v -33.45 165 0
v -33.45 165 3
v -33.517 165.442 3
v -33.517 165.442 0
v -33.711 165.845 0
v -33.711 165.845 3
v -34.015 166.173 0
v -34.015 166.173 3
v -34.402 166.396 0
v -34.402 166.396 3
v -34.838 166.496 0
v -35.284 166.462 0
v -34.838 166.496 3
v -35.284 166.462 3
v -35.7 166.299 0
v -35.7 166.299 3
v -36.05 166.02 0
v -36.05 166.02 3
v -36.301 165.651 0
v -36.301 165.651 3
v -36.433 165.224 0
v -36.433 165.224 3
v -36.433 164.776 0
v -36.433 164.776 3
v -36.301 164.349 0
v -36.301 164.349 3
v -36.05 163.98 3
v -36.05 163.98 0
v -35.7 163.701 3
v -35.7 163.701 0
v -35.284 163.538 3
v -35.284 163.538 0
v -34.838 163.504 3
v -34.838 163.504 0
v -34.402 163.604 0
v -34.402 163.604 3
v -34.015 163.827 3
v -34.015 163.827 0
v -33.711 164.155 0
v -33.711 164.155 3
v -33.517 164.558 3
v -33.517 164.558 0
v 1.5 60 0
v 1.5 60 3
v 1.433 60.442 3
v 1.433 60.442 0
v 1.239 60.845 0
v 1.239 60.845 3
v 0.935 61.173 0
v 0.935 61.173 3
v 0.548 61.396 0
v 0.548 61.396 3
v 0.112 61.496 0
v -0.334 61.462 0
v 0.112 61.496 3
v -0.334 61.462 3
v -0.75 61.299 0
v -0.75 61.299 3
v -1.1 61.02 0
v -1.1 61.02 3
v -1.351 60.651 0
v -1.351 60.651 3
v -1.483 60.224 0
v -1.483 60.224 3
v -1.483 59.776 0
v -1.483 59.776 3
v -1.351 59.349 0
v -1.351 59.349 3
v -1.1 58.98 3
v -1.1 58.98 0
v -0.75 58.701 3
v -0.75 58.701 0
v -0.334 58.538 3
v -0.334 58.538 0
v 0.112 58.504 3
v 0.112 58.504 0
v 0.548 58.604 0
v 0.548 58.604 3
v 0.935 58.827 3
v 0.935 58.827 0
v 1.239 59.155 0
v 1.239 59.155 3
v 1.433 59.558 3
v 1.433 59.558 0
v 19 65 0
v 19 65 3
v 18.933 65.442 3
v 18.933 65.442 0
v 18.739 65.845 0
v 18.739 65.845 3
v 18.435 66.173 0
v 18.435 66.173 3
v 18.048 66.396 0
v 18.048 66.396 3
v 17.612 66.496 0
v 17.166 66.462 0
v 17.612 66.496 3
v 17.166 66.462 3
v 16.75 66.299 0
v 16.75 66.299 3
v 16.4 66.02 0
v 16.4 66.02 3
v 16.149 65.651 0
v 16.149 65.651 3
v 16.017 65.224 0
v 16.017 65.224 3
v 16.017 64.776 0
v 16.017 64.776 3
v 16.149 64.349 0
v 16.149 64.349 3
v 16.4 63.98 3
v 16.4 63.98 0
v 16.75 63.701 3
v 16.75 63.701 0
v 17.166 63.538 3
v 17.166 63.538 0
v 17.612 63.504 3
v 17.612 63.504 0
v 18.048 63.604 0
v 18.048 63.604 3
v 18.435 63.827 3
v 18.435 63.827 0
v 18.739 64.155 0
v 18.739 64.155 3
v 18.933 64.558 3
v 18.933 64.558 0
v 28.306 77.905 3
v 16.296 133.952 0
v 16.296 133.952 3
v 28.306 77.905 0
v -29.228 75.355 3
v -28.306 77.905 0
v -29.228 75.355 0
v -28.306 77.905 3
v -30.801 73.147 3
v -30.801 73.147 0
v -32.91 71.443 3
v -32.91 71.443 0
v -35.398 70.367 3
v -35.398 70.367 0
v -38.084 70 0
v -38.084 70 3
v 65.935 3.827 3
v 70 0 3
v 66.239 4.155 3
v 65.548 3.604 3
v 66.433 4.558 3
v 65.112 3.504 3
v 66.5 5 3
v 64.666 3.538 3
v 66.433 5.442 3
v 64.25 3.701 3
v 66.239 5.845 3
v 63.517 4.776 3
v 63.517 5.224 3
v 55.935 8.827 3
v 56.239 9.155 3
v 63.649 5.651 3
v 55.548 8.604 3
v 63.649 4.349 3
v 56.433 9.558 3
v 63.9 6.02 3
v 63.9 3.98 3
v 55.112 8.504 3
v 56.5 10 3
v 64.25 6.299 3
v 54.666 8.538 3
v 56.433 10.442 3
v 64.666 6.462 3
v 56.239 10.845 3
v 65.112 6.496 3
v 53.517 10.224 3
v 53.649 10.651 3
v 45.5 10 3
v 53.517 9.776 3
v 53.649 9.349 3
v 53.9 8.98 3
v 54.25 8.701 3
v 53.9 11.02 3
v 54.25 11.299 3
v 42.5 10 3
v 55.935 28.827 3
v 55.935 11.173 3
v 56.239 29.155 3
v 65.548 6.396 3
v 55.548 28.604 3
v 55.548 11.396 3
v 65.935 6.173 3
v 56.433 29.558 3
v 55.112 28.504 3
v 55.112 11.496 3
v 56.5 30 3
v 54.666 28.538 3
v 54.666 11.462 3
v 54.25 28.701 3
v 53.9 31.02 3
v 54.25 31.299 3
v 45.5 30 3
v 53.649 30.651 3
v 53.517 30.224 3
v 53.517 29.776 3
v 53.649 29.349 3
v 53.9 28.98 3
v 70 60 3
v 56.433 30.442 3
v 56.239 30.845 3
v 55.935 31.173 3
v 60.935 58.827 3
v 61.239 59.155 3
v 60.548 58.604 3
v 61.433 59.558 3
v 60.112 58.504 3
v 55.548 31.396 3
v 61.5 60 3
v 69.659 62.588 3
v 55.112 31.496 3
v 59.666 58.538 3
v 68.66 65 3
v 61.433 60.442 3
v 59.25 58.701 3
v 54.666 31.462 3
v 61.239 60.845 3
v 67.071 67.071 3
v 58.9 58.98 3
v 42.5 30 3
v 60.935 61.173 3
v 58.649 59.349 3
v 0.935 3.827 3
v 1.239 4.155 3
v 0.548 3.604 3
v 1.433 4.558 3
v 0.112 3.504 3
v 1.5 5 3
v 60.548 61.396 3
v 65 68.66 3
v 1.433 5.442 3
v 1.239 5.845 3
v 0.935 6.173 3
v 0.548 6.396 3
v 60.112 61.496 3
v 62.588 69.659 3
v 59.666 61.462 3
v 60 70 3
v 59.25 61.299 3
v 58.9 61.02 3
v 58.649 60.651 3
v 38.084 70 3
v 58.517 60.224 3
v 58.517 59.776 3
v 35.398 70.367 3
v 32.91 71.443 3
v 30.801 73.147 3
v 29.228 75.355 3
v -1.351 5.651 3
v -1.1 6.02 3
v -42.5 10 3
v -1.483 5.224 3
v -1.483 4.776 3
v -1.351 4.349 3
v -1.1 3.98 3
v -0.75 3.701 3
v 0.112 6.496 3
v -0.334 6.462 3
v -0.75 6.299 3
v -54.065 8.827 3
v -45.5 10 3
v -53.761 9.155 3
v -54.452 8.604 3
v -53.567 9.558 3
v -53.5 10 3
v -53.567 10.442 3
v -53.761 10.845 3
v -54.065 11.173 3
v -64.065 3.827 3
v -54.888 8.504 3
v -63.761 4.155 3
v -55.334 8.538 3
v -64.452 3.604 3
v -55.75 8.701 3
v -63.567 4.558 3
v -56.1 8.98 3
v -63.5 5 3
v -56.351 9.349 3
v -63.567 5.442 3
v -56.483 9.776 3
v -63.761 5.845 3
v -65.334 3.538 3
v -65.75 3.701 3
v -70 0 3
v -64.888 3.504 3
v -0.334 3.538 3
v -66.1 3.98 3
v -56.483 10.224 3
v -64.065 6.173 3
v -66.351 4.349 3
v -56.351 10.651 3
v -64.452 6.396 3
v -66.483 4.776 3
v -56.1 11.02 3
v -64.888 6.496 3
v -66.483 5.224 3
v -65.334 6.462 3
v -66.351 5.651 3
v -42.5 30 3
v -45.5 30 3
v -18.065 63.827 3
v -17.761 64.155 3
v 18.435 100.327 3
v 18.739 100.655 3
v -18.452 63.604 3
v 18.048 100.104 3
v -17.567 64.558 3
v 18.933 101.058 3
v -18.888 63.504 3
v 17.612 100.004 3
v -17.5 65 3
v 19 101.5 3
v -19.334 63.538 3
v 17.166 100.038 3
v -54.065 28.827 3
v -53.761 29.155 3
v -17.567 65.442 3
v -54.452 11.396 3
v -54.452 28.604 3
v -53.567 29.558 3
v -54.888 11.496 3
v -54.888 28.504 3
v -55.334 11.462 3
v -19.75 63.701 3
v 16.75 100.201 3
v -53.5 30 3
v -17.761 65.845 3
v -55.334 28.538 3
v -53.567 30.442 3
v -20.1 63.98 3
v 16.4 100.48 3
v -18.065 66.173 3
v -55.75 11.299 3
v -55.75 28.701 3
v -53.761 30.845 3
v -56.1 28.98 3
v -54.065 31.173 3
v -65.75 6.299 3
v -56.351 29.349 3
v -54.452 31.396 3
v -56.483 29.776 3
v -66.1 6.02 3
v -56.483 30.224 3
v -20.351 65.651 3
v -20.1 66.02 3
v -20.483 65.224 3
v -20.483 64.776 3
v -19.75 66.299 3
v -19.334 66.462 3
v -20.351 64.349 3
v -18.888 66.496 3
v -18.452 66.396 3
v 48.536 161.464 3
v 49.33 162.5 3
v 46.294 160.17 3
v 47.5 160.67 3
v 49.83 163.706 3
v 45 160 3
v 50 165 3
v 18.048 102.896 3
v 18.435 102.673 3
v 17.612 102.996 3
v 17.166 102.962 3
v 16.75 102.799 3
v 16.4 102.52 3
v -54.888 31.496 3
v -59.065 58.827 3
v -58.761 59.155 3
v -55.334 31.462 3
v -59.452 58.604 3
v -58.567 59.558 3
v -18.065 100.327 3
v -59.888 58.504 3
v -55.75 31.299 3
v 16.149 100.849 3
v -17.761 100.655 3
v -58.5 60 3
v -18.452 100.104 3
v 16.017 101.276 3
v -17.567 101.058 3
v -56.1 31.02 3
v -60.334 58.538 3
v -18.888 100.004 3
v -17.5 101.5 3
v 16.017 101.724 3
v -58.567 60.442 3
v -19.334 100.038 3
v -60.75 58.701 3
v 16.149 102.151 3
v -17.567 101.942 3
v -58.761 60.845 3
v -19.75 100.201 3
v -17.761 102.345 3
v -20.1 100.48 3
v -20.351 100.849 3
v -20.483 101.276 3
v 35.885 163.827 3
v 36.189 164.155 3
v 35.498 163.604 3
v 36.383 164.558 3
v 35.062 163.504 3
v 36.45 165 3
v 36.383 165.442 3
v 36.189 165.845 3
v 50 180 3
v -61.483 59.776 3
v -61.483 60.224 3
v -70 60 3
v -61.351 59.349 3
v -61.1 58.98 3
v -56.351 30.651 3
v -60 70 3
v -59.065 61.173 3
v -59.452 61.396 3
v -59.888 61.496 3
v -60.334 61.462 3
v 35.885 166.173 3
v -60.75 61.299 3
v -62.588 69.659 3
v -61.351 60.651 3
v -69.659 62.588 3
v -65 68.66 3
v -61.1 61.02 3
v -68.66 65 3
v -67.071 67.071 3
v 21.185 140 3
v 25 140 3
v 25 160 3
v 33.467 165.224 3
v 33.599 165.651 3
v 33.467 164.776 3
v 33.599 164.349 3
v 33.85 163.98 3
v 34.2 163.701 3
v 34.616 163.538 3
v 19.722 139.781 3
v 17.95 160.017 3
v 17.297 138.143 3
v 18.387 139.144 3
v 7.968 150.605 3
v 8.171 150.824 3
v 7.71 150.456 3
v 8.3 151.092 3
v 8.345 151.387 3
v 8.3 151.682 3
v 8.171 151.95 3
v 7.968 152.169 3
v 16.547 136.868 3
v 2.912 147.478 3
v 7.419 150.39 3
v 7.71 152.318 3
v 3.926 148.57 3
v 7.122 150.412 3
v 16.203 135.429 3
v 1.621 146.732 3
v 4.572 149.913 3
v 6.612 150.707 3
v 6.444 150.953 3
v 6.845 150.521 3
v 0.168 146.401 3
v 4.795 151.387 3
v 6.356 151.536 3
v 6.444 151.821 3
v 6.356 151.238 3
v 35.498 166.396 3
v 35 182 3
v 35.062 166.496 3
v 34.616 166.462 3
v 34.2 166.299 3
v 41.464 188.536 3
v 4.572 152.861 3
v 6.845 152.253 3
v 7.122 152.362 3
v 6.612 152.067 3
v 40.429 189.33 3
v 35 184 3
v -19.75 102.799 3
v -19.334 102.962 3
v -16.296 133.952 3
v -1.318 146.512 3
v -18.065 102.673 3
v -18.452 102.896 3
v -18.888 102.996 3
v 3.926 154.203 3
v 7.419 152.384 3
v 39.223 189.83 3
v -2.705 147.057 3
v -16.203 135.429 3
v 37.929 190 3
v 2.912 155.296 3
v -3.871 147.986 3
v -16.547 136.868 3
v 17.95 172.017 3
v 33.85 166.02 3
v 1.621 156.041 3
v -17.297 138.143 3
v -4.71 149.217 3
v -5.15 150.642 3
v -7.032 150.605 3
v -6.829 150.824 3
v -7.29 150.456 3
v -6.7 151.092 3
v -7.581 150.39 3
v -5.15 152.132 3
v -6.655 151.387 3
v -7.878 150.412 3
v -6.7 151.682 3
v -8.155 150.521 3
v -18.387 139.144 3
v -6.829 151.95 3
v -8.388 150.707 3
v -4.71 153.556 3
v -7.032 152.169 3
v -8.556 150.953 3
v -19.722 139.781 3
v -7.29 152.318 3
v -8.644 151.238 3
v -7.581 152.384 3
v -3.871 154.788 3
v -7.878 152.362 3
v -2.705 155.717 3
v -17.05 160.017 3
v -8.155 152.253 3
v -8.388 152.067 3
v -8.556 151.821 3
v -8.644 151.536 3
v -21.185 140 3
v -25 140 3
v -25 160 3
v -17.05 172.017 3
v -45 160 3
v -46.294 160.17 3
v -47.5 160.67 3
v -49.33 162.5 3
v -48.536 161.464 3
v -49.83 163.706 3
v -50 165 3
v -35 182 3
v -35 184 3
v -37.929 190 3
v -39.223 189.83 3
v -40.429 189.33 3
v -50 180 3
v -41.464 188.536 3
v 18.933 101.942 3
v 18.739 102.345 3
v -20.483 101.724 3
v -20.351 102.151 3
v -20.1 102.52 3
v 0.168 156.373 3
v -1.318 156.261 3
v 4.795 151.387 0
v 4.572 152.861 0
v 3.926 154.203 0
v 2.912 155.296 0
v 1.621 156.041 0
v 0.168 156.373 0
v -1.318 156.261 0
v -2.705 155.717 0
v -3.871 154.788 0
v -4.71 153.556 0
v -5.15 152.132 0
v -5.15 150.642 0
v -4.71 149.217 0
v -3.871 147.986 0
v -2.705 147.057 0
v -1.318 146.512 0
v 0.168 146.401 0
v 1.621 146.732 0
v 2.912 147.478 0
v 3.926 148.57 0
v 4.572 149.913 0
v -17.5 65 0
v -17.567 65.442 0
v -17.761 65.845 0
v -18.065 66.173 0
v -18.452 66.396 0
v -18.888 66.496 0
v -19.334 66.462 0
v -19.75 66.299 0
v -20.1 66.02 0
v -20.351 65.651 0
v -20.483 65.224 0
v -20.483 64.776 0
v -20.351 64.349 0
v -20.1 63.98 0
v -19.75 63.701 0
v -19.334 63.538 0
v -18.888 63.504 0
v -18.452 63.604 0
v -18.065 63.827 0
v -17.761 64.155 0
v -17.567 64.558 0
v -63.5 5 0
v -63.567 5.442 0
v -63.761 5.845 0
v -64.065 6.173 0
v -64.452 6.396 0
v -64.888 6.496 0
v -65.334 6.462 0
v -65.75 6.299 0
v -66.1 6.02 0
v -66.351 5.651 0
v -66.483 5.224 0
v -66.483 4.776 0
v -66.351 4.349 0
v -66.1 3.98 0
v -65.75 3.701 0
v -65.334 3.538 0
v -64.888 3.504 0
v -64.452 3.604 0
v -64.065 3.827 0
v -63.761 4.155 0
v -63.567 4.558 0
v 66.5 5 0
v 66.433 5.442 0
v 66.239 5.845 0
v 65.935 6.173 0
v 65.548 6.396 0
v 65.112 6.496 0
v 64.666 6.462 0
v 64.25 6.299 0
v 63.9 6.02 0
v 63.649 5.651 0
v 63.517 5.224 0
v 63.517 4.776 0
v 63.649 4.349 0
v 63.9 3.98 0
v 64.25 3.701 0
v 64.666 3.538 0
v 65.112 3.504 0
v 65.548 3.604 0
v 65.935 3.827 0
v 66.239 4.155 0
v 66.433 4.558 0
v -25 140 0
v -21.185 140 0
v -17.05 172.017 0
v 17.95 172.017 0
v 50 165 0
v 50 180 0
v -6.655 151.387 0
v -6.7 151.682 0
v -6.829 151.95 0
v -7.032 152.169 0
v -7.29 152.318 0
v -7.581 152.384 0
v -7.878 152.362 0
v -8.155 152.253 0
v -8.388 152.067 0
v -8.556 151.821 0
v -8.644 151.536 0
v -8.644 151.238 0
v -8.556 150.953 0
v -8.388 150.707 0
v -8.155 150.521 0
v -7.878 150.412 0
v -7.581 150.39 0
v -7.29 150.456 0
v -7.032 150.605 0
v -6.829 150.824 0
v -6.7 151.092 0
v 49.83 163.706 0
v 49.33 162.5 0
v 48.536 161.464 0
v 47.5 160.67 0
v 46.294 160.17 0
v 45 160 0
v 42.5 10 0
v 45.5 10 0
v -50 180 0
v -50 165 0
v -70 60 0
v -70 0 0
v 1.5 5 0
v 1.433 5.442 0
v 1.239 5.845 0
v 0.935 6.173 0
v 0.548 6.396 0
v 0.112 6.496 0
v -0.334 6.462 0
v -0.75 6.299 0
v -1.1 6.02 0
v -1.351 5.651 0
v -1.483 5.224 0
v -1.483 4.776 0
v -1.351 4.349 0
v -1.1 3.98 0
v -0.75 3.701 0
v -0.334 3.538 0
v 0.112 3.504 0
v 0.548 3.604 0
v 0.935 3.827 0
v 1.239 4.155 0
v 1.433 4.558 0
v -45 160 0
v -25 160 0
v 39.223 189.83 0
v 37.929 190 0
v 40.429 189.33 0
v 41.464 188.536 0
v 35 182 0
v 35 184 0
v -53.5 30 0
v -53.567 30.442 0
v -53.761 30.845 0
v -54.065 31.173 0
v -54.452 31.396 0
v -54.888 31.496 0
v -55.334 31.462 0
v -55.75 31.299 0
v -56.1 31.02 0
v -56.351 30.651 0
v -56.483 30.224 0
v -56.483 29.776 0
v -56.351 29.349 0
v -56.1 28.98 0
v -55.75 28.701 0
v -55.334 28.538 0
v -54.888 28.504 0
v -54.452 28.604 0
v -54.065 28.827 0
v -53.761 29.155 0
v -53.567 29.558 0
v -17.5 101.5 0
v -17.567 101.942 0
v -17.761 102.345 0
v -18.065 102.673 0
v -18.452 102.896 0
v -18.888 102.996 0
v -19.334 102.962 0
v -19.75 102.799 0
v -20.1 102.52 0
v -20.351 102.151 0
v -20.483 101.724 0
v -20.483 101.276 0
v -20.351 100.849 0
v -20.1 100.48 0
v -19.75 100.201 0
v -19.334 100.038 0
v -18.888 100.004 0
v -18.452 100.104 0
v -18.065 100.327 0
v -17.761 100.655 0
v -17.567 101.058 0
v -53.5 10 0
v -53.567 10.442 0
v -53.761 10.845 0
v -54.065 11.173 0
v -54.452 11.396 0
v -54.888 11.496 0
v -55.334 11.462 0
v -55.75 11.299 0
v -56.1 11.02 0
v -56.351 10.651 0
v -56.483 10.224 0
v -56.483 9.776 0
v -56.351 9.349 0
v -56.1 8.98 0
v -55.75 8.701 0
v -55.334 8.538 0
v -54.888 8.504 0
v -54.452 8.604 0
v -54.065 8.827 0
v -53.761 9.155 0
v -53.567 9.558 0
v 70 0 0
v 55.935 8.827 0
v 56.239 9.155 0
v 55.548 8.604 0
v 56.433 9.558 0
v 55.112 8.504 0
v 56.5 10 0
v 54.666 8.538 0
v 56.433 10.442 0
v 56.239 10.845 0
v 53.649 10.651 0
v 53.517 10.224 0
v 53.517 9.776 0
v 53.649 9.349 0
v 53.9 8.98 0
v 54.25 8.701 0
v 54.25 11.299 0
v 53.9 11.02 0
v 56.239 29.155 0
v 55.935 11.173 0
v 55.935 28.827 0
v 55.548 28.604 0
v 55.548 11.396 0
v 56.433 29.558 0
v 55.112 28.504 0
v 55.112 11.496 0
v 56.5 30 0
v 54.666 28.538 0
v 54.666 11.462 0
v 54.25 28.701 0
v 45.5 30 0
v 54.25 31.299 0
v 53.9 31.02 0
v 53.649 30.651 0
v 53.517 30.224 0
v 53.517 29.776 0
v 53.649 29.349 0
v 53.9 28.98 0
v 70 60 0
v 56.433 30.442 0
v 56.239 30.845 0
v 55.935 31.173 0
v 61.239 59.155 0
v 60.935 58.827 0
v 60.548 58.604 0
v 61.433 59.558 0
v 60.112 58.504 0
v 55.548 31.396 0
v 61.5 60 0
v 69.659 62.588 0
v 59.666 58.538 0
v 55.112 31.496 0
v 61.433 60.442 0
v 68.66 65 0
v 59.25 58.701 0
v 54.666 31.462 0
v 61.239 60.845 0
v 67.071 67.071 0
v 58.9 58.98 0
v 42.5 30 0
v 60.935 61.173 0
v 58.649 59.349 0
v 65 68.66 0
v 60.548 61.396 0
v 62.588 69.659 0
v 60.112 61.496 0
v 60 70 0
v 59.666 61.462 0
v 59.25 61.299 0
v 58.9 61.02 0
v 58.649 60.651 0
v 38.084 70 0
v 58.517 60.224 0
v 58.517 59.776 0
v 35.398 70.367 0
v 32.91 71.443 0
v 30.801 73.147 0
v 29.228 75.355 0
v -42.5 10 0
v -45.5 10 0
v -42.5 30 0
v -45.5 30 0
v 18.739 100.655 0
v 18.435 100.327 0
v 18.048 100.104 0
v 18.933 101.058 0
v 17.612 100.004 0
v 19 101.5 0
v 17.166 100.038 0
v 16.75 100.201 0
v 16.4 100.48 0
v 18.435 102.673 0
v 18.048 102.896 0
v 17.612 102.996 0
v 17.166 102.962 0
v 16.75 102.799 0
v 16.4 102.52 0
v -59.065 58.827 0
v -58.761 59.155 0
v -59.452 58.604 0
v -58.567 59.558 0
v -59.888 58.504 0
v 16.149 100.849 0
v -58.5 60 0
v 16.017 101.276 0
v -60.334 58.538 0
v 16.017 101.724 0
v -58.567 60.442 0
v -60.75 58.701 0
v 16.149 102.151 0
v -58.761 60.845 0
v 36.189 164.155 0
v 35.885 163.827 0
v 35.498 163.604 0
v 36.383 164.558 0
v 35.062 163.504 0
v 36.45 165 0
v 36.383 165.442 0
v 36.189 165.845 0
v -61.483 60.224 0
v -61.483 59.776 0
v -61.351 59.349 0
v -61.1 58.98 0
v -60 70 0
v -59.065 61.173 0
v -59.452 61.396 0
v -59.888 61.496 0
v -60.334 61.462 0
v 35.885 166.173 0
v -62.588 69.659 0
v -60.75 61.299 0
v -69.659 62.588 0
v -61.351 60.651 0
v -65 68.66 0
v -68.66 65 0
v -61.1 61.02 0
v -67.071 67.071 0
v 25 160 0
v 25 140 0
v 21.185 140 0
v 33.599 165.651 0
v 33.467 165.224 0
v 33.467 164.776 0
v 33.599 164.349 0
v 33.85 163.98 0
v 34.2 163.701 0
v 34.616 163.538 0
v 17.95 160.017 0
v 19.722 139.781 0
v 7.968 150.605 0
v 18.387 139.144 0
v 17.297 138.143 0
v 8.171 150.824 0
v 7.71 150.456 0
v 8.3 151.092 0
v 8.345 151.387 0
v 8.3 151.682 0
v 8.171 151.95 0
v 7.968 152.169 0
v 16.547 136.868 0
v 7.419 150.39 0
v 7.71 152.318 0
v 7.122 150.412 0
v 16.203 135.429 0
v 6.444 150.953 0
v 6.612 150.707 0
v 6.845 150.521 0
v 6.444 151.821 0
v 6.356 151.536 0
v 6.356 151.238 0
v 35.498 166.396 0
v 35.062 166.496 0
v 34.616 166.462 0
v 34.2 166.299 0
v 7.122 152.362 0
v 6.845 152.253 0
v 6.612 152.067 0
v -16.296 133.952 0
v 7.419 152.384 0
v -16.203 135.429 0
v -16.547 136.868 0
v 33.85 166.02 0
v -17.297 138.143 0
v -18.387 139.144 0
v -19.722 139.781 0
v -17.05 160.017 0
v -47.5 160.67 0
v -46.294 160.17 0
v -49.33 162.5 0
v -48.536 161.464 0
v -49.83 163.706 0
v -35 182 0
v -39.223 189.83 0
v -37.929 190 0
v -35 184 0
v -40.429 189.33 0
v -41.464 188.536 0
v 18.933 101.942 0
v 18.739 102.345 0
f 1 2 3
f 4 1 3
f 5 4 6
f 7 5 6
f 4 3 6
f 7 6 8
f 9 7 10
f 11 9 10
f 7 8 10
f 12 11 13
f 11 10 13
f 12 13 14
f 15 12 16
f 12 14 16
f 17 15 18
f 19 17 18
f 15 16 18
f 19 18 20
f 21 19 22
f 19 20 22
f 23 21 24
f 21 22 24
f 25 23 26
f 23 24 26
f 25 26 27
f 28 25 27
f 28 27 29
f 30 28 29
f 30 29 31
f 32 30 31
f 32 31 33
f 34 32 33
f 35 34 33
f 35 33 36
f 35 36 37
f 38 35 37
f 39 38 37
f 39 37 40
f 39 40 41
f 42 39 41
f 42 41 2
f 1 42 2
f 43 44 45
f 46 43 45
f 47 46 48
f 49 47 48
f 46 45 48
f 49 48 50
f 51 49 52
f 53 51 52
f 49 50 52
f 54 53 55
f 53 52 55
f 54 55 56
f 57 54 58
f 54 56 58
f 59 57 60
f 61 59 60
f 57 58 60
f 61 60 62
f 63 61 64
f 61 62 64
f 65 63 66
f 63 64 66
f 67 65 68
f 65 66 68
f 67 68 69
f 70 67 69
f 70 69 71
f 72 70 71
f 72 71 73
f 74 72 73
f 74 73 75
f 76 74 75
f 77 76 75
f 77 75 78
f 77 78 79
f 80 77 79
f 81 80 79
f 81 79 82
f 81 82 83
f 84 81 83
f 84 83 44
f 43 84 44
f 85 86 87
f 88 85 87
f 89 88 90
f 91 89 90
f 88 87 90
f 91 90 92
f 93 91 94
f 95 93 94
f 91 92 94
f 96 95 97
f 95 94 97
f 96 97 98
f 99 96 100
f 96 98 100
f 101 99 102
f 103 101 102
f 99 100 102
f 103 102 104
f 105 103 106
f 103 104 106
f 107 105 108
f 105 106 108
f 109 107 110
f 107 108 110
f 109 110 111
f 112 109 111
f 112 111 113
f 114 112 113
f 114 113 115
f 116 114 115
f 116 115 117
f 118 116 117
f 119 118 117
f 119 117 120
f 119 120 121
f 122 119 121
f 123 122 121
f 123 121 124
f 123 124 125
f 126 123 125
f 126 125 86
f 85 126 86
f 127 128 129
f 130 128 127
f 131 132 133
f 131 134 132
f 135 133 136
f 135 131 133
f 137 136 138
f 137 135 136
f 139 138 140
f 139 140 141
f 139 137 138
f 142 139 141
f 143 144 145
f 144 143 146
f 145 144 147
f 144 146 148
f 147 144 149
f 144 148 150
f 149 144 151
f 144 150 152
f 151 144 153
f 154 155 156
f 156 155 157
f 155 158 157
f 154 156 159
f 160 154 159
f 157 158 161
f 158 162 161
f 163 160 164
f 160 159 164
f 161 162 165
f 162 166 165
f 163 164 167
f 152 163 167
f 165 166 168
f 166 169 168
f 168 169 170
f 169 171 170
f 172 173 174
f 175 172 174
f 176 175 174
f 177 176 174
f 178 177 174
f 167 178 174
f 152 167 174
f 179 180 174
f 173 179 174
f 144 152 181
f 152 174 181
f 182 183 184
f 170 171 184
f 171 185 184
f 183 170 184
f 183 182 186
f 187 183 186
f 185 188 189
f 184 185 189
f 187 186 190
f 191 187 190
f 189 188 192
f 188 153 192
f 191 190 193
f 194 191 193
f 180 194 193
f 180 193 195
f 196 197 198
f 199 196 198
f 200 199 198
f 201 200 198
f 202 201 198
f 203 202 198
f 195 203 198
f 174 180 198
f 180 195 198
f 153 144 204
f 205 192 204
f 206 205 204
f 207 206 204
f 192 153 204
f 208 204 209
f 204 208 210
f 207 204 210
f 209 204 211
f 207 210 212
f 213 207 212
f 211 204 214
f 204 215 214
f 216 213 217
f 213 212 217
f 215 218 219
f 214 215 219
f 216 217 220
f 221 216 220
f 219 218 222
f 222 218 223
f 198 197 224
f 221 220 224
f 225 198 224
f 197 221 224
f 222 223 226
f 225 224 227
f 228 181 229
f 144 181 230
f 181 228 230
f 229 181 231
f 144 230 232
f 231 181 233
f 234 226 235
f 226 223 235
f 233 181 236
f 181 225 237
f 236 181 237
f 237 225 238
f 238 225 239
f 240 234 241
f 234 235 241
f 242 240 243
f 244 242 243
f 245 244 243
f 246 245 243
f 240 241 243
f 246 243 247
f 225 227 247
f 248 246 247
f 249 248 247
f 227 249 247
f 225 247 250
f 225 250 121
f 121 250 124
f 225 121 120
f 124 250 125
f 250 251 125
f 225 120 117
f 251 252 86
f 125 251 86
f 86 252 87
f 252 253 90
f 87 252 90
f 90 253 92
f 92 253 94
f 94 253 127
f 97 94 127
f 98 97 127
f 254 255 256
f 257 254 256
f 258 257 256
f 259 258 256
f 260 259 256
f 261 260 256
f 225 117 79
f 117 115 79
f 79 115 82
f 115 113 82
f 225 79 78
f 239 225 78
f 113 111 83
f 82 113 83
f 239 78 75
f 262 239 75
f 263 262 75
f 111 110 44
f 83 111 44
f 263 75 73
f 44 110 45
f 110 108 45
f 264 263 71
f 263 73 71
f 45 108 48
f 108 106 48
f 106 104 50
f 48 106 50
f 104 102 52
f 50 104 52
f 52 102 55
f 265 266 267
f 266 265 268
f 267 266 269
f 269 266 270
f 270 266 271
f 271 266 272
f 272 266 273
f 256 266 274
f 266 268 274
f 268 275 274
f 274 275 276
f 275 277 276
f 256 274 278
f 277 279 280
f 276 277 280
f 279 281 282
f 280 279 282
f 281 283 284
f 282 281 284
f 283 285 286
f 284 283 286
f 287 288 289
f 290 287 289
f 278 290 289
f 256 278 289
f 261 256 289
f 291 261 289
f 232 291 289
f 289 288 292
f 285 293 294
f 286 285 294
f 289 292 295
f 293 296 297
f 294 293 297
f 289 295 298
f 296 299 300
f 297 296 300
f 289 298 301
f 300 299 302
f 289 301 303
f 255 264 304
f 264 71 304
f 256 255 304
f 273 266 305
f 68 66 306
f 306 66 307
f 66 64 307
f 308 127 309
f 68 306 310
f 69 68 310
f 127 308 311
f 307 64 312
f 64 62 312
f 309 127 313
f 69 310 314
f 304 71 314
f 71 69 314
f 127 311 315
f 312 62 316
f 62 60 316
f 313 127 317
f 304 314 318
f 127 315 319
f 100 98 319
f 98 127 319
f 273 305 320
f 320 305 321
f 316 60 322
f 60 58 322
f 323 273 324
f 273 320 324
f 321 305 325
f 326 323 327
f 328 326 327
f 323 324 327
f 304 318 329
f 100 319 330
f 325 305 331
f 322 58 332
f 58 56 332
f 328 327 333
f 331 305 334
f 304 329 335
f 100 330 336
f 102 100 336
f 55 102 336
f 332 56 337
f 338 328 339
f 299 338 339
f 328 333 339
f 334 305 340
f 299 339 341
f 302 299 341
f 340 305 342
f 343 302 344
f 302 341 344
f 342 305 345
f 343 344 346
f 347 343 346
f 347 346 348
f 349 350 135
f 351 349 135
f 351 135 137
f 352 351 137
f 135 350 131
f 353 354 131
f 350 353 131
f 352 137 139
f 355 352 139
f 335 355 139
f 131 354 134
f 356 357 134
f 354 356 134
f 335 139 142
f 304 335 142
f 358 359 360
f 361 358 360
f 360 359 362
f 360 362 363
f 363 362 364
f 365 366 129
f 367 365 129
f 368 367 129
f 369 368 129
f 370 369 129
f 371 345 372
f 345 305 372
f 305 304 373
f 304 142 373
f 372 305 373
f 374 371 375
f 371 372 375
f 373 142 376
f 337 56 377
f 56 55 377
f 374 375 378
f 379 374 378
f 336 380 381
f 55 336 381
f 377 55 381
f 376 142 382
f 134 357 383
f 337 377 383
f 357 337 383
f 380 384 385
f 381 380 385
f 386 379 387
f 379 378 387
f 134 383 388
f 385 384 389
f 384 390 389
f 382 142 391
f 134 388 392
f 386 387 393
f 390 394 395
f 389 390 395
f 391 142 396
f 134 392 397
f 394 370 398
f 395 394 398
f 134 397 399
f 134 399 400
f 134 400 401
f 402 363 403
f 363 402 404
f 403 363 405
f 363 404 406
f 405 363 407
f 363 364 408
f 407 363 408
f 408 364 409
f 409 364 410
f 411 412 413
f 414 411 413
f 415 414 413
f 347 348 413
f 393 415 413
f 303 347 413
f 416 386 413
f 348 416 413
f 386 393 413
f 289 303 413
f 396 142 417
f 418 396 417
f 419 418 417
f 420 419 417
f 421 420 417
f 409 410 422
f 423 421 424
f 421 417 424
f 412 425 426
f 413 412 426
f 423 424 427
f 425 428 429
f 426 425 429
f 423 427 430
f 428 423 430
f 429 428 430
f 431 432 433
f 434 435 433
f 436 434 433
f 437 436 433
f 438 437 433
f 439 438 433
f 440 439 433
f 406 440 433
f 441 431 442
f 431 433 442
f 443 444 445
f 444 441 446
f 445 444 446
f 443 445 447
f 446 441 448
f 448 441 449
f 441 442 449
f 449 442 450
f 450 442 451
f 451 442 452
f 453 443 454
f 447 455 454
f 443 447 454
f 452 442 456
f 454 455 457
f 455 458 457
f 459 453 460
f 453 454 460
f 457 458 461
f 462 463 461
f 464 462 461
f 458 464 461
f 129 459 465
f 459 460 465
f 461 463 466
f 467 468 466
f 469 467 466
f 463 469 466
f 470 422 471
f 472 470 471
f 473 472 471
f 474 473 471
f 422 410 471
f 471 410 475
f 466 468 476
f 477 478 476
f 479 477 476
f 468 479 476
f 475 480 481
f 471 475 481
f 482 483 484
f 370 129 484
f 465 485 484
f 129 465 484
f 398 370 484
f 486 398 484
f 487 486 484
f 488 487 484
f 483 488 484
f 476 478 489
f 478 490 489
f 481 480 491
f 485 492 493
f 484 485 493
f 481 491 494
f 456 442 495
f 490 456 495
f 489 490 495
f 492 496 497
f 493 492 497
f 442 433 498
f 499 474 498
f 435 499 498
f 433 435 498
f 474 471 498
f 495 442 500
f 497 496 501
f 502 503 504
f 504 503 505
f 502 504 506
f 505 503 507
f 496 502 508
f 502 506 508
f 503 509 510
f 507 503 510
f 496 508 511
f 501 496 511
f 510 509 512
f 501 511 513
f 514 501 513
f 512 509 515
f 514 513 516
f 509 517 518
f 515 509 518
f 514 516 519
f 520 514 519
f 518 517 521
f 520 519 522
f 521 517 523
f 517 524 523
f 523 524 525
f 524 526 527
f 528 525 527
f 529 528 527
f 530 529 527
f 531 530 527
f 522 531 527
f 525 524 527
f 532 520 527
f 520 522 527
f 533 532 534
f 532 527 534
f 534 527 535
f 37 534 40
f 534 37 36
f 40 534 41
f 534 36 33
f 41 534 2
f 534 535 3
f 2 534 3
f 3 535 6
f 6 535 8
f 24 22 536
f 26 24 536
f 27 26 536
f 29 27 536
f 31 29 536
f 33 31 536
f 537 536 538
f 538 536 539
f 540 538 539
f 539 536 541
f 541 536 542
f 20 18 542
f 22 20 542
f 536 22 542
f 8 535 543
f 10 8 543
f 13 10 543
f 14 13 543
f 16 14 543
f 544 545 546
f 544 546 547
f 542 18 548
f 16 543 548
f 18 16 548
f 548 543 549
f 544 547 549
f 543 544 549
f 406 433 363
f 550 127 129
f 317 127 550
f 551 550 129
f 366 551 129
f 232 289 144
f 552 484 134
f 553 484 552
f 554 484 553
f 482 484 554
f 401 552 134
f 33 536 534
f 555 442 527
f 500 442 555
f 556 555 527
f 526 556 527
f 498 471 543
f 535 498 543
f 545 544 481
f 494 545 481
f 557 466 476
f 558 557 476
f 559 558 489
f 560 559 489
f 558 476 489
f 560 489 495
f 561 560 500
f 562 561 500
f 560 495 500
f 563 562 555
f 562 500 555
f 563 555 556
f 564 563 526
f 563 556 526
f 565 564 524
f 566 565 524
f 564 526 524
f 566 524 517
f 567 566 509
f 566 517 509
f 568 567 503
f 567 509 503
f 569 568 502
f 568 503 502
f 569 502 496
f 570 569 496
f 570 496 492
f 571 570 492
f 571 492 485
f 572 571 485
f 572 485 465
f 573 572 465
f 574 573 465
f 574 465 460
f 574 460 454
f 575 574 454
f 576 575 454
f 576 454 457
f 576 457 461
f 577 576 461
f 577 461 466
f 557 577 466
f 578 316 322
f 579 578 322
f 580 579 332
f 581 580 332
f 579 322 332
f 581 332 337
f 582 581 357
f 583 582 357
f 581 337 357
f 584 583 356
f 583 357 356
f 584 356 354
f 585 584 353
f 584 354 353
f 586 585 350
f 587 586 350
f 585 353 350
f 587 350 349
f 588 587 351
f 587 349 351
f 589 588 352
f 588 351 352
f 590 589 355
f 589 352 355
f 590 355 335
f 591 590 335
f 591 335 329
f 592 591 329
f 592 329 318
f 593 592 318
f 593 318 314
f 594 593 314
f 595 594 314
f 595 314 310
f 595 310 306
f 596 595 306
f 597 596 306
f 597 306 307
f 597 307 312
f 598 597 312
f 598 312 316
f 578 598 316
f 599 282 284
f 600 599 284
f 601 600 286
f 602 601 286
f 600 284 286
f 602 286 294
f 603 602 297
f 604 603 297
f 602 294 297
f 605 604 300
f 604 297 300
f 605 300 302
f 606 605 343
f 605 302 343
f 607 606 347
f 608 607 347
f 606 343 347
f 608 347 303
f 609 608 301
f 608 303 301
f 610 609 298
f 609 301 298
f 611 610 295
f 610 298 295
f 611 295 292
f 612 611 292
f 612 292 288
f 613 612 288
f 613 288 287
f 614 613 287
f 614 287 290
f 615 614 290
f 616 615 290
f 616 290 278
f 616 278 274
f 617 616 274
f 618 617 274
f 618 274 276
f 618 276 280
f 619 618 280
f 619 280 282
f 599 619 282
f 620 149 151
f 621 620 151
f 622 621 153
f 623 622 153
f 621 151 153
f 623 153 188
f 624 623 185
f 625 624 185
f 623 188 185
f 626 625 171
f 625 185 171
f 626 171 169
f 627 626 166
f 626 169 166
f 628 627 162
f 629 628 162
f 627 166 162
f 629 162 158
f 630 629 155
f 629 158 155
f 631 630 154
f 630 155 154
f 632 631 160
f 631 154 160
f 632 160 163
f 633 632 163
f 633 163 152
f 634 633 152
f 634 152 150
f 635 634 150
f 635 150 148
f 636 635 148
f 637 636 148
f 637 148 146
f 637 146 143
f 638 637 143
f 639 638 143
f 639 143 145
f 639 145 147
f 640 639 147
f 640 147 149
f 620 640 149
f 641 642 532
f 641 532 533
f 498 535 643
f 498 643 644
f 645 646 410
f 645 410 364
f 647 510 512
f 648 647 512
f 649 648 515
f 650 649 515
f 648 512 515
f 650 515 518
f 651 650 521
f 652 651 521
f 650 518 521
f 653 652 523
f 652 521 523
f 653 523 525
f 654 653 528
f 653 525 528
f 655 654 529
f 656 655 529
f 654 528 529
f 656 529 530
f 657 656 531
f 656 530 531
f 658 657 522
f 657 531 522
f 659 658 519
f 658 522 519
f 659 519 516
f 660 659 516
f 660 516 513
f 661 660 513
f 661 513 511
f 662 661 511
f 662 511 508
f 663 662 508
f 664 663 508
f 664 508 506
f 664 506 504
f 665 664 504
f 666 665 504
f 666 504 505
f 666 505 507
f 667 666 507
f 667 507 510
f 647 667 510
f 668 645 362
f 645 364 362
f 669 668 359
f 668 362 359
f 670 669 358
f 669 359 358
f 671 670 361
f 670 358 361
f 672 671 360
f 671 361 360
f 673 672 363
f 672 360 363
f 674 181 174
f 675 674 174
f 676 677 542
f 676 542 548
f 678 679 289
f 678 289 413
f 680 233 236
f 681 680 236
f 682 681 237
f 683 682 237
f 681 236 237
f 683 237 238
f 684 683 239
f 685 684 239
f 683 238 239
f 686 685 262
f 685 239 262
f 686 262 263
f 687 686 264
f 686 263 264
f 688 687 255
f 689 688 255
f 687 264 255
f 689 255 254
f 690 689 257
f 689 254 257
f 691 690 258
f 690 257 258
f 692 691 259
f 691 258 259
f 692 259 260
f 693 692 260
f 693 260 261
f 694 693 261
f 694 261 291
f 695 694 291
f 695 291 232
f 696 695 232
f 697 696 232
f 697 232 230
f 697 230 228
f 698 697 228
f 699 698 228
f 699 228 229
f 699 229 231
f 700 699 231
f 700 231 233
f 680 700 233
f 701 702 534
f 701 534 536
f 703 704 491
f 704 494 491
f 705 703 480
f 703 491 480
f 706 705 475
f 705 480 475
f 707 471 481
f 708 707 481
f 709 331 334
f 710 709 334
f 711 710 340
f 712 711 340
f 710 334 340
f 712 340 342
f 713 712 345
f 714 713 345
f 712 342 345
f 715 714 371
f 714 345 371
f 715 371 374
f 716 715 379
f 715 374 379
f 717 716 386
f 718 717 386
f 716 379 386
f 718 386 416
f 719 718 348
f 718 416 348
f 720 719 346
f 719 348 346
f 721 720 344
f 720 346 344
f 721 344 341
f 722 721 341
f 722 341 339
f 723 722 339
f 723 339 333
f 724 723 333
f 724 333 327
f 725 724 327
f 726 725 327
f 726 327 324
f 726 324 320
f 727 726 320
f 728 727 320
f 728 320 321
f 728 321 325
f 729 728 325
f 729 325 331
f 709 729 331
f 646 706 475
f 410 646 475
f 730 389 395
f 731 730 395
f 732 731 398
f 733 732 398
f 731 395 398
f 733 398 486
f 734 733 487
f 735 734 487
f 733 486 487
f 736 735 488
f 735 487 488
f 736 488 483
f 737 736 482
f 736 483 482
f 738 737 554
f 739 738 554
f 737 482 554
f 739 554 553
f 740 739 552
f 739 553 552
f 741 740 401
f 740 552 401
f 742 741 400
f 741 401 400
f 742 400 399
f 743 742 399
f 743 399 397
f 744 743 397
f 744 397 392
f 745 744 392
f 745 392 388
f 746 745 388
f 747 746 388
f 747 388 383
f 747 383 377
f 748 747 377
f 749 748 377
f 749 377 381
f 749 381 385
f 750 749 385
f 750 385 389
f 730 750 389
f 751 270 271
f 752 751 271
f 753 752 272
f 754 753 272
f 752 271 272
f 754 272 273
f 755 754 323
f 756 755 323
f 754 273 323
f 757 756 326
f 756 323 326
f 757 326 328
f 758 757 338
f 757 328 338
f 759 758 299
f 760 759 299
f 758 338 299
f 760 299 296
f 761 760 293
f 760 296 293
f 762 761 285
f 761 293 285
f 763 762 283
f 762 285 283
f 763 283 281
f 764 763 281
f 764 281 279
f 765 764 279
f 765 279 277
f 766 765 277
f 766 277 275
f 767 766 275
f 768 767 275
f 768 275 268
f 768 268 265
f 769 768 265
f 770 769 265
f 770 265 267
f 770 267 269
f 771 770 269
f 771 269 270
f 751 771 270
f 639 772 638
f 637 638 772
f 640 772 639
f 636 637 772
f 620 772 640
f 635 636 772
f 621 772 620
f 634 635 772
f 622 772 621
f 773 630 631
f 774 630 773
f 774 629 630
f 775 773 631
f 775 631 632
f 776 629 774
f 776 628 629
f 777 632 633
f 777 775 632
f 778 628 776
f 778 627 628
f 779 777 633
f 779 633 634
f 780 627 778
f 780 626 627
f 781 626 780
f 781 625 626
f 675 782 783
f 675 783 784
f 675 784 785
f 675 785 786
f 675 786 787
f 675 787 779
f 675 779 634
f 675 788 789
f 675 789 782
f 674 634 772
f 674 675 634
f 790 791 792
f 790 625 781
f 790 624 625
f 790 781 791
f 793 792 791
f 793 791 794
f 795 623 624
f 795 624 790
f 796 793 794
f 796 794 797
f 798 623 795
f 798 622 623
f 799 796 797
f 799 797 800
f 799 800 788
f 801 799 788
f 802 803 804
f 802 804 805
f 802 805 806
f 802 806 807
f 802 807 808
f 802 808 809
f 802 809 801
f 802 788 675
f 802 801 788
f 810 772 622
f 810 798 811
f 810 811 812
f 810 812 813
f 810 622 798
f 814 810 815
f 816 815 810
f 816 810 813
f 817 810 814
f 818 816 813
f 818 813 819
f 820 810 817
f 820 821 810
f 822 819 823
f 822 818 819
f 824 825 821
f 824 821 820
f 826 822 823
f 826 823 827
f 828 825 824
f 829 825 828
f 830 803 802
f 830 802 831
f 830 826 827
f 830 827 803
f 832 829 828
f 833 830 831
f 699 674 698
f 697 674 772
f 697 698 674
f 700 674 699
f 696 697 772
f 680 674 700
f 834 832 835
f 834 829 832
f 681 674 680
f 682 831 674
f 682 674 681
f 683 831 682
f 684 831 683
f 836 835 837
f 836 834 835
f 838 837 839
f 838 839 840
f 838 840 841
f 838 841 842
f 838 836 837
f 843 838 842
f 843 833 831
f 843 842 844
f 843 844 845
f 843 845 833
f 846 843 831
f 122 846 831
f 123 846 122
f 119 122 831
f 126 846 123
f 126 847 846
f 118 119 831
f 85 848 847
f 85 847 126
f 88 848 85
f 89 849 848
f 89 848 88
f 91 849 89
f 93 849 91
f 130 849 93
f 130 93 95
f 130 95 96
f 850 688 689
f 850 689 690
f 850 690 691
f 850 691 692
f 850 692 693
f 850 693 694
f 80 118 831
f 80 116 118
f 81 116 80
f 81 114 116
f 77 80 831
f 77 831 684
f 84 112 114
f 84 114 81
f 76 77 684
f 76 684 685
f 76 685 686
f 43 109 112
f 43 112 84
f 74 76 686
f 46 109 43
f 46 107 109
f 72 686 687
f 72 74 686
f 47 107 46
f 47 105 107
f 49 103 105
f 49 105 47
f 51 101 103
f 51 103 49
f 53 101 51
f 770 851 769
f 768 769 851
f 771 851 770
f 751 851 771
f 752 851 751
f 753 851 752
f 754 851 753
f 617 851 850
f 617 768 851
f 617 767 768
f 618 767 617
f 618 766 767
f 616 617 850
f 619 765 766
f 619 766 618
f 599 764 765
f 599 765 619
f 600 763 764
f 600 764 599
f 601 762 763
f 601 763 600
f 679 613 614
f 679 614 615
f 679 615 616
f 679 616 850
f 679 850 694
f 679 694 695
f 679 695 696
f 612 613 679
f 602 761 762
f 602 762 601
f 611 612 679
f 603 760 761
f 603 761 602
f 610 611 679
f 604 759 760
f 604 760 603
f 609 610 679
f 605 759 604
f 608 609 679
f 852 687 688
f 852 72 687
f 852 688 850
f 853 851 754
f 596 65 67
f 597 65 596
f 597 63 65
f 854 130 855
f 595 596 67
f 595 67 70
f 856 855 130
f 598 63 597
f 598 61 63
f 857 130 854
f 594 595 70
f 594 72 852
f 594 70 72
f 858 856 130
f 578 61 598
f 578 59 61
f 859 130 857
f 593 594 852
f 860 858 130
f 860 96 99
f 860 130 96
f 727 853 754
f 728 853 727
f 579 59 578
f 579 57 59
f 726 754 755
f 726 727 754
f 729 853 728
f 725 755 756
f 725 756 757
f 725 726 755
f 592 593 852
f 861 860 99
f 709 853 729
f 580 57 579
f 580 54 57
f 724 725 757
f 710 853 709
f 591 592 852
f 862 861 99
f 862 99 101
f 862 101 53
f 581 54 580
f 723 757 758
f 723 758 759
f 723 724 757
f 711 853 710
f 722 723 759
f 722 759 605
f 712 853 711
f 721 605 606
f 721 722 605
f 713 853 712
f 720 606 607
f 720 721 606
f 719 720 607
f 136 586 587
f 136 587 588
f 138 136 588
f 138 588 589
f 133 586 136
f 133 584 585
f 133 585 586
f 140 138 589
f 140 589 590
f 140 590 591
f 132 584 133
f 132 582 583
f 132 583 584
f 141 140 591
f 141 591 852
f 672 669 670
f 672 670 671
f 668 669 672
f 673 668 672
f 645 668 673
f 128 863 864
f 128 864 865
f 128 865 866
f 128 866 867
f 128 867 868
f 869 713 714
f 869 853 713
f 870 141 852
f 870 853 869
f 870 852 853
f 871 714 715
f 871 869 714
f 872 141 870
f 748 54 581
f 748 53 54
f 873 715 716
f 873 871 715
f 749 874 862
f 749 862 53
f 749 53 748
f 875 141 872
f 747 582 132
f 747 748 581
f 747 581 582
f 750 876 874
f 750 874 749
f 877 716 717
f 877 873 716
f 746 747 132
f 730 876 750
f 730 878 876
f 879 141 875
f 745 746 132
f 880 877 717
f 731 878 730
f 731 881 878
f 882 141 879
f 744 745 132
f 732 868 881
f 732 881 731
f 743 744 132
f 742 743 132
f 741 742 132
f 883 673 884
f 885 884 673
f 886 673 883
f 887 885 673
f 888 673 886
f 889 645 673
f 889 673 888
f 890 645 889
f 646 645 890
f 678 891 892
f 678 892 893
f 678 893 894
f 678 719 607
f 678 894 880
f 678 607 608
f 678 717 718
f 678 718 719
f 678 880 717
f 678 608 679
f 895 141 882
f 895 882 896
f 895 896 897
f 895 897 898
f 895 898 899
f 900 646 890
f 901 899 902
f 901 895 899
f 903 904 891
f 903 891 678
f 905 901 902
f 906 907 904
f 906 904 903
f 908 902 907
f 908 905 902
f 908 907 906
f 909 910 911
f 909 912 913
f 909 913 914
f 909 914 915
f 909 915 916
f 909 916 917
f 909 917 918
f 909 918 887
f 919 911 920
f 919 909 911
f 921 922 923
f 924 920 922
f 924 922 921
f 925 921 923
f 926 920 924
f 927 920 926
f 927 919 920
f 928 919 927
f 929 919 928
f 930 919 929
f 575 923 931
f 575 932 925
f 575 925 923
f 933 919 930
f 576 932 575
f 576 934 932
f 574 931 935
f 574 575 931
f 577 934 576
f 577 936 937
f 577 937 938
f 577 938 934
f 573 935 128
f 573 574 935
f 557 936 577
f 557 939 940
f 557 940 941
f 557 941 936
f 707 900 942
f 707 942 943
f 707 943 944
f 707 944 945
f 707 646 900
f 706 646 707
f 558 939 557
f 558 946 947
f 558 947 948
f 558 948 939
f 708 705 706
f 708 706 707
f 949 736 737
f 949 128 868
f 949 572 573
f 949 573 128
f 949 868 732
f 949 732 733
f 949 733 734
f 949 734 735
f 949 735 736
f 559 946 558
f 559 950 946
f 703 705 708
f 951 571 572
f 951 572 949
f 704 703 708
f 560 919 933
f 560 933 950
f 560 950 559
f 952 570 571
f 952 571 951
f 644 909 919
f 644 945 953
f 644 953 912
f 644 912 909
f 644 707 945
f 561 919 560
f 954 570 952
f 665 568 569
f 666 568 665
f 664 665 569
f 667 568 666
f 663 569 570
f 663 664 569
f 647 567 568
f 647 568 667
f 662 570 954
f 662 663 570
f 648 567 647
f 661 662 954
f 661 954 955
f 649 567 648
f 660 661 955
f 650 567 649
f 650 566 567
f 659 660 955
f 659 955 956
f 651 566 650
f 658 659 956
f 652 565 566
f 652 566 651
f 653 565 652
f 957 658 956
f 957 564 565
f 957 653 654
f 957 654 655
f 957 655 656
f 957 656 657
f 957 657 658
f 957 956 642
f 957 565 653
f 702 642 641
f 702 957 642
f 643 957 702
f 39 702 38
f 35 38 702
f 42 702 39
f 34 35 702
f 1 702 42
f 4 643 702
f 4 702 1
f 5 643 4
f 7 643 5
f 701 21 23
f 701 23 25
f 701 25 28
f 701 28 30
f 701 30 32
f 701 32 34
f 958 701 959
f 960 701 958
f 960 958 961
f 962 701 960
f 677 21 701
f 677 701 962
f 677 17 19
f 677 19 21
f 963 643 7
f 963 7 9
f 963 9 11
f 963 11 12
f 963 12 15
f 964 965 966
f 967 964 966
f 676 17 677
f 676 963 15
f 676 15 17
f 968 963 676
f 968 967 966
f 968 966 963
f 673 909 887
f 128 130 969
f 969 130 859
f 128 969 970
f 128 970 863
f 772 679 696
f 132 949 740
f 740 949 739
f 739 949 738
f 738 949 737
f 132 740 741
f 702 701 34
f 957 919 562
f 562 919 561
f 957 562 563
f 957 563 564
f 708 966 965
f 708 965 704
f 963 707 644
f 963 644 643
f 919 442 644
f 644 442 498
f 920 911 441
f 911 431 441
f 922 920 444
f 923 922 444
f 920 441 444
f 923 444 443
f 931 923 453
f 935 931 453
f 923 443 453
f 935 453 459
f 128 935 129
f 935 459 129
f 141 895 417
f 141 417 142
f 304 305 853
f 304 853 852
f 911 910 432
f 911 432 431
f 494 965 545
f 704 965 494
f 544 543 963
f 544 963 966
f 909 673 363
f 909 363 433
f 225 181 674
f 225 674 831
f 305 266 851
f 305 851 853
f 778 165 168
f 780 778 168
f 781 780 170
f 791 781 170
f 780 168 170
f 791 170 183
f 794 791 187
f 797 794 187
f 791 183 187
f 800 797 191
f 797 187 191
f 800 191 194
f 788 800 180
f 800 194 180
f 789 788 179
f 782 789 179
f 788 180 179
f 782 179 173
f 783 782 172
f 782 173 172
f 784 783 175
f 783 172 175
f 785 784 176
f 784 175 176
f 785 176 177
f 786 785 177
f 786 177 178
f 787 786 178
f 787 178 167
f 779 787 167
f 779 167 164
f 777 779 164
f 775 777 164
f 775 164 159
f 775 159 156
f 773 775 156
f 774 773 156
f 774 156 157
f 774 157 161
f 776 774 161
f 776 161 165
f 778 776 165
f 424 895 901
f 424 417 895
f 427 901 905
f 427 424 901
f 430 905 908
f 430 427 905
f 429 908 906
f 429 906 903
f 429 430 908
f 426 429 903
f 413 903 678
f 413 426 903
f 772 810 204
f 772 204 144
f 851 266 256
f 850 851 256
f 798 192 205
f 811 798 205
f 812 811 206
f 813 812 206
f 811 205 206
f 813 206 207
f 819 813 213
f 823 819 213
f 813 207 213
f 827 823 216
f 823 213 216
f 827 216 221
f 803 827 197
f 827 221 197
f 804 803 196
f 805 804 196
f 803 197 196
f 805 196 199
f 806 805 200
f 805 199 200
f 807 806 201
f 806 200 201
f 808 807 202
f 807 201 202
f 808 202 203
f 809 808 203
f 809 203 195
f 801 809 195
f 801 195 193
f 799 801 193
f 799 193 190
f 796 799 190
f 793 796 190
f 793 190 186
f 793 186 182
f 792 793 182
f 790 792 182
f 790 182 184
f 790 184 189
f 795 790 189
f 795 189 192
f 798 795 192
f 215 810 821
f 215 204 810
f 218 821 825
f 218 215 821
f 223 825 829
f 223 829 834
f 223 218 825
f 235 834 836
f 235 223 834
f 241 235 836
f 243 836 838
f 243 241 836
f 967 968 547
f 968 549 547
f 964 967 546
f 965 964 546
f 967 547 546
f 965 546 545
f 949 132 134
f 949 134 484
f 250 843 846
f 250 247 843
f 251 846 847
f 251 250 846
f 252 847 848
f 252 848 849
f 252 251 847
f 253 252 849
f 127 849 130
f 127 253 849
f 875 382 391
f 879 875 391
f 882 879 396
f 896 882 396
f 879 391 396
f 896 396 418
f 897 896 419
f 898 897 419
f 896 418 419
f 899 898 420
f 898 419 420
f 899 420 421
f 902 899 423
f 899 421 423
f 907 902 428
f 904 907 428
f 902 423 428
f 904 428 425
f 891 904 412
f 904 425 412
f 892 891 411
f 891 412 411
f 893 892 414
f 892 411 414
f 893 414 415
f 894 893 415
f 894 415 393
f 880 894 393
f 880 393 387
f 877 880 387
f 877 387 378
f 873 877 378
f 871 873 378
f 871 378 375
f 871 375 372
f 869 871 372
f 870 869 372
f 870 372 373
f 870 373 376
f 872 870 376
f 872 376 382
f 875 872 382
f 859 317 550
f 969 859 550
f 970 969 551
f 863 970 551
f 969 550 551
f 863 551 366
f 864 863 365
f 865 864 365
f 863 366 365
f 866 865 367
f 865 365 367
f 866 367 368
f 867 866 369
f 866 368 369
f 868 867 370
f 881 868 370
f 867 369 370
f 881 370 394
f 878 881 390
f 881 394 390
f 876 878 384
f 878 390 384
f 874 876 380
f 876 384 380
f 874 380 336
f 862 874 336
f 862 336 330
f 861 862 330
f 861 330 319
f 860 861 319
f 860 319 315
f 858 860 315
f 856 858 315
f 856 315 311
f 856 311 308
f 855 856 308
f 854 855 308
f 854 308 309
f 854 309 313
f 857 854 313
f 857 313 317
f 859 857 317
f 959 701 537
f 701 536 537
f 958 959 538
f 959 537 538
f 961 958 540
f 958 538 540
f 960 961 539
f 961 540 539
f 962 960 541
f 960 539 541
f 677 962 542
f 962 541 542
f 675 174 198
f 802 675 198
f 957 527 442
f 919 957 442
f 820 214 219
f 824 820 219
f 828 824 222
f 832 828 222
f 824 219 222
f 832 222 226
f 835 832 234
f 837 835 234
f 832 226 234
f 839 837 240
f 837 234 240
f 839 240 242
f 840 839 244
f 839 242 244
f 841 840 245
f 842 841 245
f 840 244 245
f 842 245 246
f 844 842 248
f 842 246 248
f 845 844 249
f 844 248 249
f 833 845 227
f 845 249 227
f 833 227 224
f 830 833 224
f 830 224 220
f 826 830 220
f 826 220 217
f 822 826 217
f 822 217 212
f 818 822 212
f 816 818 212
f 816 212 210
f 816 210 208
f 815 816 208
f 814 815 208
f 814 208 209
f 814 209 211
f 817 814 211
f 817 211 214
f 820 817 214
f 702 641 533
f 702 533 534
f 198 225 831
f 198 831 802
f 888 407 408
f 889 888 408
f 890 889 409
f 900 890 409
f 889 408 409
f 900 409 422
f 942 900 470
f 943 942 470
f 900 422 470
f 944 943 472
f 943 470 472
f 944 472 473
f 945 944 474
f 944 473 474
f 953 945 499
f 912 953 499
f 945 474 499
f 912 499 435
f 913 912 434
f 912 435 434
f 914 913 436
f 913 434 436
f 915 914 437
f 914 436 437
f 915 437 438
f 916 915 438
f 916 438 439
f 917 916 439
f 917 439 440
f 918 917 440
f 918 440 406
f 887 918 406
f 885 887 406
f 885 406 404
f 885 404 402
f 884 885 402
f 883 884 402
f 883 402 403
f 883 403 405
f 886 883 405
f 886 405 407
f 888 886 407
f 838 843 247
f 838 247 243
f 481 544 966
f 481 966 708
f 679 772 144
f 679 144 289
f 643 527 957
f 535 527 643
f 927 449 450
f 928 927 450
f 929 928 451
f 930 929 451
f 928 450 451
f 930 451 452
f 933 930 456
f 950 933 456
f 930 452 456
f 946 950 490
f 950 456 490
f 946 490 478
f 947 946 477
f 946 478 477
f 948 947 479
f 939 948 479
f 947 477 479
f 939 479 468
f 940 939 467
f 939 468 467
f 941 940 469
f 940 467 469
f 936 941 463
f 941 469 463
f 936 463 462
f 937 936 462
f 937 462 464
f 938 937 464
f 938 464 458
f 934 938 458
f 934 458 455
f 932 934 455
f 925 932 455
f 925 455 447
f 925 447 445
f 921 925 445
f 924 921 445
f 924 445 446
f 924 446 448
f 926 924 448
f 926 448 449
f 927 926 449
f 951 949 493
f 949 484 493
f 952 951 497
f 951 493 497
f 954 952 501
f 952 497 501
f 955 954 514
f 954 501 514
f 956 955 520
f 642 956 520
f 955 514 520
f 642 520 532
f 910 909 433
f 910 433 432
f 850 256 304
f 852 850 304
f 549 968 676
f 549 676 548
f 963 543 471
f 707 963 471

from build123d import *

# Parameters (mm, degrees)
SALIENTE_EXTRUIR1_DEPTH = 3
REDONDEO1_R             = 5
REDONDEO2_R             = 10
CROQUIS2_R              = 1.5
CROQUIS2_R_2            = 5
CROQUIS2_R_3            = 1
CROQUIS2_W              = 35
CROQUIS2_H              = 12
CROQUIS2_W_2            = 70
CROQUIS2_H_2            = 2
CROQUIS2_W_3            = 3
CROQUIS2_H_3            = 20
CORTAR_EXTRUIR1_DEPTH   = 10
CHAFL_N1_SIZE           = 10
REDONDEO3_R             = 5


with BuildPart() as part:
    # Croquis1 → Saliente-Extruir1 (new body)
    with BuildSketch(Plane.XY):
        Polygon((70, 0), (-70, 0), (-70, 70), (-30, 70), (-15, 140), (-25, 140), (-25, 160), (-50, 160), (-50, 190), (50, 190), (50, 160), (25, 160), (25, 140), (15, 140), (30, 70), (70, 70), align=None)
    extrude(amount=SALIENTE_EXTRUIR1_DEPTH)

    # Redondeo1
    redondeo1_edges = [part.edges().sort_by_distance(p)[0] for p in [
        (-15, 140, 1.5),
        (-50, 160, 1.5),
        (50, 160, 1.5),
        (15, 140, 1.5),
    ]]
    fillet(redondeo1_edges, radius=REDONDEO1_R)

    # Redondeo2
    redondeo2_edges = [part.edges().sort_by_distance(p)[0] for p in [
        (-70, 70, 1.5),
        (-30, 70, 1.5),
        (30, 70, 1.5),
        (70, 70, 1.5),
    ]]
    fillet(redondeo2_edges, radius=REDONDEO2_R)

    # Croquis2 → Cortar-Extruir1 (cut)
    with BuildSketch(Plane.XY.offset(3)):
        with Locations((-55, 10)):
            Circle(CROQUIS2_R)
        with Locations((-55, 30)):
            Circle(CROQUIS2_R)
        with Locations((55, 10)):
            Circle(CROQUIS2_R)
        with Locations((55, 30)):
            Circle(CROQUIS2_R)
        with Locations((34.95, 165)):
            Circle(CROQUIS2_R)
        with Locations((-0.20543979, 151.386853188)):
            Circle(CROQUIS2_R_2)
        with Locations((-7.65543979, 151.386853188)):
            Circle(CROQUIS2_R_3)
        with Locations((7.34456021, 151.386853188)):
            Circle(CROQUIS2_R_3)
        with Locations((-65, 5)):
            Circle(CROQUIS2_R)
        with Locations((-60, 60)):
            Circle(CROQUIS2_R)
        with Locations((65, 5)):
            Circle(CROQUIS2_R)
        with Locations((60, 60)):
            Circle(CROQUIS2_R)
        with Locations((0, 5)):
            Circle(CROQUIS2_R)
        with Locations((0, 60)):
            Circle(CROQUIS2_R)
        with Locations((-19, 65)):
            Circle(CROQUIS2_R)
        with Locations((17.5, 65)):
            Circle(CROQUIS2_R)
        with Locations((-19, 101.5)):
            Circle(CROQUIS2_R)
        with Locations((17.5, 101.5)):
            Circle(CROQUIS2_R)
        with Locations((-34.95, 165)):
            Circle(CROQUIS2_R)
        with Locations((0.45, 166.017006834)):
            Rectangle(CROQUIS2_W, CROQUIS2_H)
        with Locations((0, 183)):
            Rectangle(CROQUIS2_W_2, CROQUIS2_H_2)
        with Locations((-44, 20)):
            Rectangle(CROQUIS2_W_3, CROQUIS2_H_3)
        with Locations((44, 20)):
            Rectangle(CROQUIS2_W_3, CROQUIS2_H_3)
    extrude(amount=-CORTAR_EXTRUIR1_DEPTH, mode=Mode.SUBTRACT)

    # Chaflán1
    chafl_n1_edges = [part.edges().sort_by_distance(p)[0] for p in [
        (-50, 190, 1.5),
        (50, 190, 1.5),
    ]]
    chamfer(chafl_n1_edges, length=CHAFL_N1_SIZE)

    # Redondeo3
    redondeo3_edges = [part.edges().sort_by_distance(p)[0] for p in [
        (40, 190, 1.5),
        (-40, 190, 1.5),
    ]]
    fillet(redondeo3_edges, radius=REDONDEO3_R)


solid = part.part
